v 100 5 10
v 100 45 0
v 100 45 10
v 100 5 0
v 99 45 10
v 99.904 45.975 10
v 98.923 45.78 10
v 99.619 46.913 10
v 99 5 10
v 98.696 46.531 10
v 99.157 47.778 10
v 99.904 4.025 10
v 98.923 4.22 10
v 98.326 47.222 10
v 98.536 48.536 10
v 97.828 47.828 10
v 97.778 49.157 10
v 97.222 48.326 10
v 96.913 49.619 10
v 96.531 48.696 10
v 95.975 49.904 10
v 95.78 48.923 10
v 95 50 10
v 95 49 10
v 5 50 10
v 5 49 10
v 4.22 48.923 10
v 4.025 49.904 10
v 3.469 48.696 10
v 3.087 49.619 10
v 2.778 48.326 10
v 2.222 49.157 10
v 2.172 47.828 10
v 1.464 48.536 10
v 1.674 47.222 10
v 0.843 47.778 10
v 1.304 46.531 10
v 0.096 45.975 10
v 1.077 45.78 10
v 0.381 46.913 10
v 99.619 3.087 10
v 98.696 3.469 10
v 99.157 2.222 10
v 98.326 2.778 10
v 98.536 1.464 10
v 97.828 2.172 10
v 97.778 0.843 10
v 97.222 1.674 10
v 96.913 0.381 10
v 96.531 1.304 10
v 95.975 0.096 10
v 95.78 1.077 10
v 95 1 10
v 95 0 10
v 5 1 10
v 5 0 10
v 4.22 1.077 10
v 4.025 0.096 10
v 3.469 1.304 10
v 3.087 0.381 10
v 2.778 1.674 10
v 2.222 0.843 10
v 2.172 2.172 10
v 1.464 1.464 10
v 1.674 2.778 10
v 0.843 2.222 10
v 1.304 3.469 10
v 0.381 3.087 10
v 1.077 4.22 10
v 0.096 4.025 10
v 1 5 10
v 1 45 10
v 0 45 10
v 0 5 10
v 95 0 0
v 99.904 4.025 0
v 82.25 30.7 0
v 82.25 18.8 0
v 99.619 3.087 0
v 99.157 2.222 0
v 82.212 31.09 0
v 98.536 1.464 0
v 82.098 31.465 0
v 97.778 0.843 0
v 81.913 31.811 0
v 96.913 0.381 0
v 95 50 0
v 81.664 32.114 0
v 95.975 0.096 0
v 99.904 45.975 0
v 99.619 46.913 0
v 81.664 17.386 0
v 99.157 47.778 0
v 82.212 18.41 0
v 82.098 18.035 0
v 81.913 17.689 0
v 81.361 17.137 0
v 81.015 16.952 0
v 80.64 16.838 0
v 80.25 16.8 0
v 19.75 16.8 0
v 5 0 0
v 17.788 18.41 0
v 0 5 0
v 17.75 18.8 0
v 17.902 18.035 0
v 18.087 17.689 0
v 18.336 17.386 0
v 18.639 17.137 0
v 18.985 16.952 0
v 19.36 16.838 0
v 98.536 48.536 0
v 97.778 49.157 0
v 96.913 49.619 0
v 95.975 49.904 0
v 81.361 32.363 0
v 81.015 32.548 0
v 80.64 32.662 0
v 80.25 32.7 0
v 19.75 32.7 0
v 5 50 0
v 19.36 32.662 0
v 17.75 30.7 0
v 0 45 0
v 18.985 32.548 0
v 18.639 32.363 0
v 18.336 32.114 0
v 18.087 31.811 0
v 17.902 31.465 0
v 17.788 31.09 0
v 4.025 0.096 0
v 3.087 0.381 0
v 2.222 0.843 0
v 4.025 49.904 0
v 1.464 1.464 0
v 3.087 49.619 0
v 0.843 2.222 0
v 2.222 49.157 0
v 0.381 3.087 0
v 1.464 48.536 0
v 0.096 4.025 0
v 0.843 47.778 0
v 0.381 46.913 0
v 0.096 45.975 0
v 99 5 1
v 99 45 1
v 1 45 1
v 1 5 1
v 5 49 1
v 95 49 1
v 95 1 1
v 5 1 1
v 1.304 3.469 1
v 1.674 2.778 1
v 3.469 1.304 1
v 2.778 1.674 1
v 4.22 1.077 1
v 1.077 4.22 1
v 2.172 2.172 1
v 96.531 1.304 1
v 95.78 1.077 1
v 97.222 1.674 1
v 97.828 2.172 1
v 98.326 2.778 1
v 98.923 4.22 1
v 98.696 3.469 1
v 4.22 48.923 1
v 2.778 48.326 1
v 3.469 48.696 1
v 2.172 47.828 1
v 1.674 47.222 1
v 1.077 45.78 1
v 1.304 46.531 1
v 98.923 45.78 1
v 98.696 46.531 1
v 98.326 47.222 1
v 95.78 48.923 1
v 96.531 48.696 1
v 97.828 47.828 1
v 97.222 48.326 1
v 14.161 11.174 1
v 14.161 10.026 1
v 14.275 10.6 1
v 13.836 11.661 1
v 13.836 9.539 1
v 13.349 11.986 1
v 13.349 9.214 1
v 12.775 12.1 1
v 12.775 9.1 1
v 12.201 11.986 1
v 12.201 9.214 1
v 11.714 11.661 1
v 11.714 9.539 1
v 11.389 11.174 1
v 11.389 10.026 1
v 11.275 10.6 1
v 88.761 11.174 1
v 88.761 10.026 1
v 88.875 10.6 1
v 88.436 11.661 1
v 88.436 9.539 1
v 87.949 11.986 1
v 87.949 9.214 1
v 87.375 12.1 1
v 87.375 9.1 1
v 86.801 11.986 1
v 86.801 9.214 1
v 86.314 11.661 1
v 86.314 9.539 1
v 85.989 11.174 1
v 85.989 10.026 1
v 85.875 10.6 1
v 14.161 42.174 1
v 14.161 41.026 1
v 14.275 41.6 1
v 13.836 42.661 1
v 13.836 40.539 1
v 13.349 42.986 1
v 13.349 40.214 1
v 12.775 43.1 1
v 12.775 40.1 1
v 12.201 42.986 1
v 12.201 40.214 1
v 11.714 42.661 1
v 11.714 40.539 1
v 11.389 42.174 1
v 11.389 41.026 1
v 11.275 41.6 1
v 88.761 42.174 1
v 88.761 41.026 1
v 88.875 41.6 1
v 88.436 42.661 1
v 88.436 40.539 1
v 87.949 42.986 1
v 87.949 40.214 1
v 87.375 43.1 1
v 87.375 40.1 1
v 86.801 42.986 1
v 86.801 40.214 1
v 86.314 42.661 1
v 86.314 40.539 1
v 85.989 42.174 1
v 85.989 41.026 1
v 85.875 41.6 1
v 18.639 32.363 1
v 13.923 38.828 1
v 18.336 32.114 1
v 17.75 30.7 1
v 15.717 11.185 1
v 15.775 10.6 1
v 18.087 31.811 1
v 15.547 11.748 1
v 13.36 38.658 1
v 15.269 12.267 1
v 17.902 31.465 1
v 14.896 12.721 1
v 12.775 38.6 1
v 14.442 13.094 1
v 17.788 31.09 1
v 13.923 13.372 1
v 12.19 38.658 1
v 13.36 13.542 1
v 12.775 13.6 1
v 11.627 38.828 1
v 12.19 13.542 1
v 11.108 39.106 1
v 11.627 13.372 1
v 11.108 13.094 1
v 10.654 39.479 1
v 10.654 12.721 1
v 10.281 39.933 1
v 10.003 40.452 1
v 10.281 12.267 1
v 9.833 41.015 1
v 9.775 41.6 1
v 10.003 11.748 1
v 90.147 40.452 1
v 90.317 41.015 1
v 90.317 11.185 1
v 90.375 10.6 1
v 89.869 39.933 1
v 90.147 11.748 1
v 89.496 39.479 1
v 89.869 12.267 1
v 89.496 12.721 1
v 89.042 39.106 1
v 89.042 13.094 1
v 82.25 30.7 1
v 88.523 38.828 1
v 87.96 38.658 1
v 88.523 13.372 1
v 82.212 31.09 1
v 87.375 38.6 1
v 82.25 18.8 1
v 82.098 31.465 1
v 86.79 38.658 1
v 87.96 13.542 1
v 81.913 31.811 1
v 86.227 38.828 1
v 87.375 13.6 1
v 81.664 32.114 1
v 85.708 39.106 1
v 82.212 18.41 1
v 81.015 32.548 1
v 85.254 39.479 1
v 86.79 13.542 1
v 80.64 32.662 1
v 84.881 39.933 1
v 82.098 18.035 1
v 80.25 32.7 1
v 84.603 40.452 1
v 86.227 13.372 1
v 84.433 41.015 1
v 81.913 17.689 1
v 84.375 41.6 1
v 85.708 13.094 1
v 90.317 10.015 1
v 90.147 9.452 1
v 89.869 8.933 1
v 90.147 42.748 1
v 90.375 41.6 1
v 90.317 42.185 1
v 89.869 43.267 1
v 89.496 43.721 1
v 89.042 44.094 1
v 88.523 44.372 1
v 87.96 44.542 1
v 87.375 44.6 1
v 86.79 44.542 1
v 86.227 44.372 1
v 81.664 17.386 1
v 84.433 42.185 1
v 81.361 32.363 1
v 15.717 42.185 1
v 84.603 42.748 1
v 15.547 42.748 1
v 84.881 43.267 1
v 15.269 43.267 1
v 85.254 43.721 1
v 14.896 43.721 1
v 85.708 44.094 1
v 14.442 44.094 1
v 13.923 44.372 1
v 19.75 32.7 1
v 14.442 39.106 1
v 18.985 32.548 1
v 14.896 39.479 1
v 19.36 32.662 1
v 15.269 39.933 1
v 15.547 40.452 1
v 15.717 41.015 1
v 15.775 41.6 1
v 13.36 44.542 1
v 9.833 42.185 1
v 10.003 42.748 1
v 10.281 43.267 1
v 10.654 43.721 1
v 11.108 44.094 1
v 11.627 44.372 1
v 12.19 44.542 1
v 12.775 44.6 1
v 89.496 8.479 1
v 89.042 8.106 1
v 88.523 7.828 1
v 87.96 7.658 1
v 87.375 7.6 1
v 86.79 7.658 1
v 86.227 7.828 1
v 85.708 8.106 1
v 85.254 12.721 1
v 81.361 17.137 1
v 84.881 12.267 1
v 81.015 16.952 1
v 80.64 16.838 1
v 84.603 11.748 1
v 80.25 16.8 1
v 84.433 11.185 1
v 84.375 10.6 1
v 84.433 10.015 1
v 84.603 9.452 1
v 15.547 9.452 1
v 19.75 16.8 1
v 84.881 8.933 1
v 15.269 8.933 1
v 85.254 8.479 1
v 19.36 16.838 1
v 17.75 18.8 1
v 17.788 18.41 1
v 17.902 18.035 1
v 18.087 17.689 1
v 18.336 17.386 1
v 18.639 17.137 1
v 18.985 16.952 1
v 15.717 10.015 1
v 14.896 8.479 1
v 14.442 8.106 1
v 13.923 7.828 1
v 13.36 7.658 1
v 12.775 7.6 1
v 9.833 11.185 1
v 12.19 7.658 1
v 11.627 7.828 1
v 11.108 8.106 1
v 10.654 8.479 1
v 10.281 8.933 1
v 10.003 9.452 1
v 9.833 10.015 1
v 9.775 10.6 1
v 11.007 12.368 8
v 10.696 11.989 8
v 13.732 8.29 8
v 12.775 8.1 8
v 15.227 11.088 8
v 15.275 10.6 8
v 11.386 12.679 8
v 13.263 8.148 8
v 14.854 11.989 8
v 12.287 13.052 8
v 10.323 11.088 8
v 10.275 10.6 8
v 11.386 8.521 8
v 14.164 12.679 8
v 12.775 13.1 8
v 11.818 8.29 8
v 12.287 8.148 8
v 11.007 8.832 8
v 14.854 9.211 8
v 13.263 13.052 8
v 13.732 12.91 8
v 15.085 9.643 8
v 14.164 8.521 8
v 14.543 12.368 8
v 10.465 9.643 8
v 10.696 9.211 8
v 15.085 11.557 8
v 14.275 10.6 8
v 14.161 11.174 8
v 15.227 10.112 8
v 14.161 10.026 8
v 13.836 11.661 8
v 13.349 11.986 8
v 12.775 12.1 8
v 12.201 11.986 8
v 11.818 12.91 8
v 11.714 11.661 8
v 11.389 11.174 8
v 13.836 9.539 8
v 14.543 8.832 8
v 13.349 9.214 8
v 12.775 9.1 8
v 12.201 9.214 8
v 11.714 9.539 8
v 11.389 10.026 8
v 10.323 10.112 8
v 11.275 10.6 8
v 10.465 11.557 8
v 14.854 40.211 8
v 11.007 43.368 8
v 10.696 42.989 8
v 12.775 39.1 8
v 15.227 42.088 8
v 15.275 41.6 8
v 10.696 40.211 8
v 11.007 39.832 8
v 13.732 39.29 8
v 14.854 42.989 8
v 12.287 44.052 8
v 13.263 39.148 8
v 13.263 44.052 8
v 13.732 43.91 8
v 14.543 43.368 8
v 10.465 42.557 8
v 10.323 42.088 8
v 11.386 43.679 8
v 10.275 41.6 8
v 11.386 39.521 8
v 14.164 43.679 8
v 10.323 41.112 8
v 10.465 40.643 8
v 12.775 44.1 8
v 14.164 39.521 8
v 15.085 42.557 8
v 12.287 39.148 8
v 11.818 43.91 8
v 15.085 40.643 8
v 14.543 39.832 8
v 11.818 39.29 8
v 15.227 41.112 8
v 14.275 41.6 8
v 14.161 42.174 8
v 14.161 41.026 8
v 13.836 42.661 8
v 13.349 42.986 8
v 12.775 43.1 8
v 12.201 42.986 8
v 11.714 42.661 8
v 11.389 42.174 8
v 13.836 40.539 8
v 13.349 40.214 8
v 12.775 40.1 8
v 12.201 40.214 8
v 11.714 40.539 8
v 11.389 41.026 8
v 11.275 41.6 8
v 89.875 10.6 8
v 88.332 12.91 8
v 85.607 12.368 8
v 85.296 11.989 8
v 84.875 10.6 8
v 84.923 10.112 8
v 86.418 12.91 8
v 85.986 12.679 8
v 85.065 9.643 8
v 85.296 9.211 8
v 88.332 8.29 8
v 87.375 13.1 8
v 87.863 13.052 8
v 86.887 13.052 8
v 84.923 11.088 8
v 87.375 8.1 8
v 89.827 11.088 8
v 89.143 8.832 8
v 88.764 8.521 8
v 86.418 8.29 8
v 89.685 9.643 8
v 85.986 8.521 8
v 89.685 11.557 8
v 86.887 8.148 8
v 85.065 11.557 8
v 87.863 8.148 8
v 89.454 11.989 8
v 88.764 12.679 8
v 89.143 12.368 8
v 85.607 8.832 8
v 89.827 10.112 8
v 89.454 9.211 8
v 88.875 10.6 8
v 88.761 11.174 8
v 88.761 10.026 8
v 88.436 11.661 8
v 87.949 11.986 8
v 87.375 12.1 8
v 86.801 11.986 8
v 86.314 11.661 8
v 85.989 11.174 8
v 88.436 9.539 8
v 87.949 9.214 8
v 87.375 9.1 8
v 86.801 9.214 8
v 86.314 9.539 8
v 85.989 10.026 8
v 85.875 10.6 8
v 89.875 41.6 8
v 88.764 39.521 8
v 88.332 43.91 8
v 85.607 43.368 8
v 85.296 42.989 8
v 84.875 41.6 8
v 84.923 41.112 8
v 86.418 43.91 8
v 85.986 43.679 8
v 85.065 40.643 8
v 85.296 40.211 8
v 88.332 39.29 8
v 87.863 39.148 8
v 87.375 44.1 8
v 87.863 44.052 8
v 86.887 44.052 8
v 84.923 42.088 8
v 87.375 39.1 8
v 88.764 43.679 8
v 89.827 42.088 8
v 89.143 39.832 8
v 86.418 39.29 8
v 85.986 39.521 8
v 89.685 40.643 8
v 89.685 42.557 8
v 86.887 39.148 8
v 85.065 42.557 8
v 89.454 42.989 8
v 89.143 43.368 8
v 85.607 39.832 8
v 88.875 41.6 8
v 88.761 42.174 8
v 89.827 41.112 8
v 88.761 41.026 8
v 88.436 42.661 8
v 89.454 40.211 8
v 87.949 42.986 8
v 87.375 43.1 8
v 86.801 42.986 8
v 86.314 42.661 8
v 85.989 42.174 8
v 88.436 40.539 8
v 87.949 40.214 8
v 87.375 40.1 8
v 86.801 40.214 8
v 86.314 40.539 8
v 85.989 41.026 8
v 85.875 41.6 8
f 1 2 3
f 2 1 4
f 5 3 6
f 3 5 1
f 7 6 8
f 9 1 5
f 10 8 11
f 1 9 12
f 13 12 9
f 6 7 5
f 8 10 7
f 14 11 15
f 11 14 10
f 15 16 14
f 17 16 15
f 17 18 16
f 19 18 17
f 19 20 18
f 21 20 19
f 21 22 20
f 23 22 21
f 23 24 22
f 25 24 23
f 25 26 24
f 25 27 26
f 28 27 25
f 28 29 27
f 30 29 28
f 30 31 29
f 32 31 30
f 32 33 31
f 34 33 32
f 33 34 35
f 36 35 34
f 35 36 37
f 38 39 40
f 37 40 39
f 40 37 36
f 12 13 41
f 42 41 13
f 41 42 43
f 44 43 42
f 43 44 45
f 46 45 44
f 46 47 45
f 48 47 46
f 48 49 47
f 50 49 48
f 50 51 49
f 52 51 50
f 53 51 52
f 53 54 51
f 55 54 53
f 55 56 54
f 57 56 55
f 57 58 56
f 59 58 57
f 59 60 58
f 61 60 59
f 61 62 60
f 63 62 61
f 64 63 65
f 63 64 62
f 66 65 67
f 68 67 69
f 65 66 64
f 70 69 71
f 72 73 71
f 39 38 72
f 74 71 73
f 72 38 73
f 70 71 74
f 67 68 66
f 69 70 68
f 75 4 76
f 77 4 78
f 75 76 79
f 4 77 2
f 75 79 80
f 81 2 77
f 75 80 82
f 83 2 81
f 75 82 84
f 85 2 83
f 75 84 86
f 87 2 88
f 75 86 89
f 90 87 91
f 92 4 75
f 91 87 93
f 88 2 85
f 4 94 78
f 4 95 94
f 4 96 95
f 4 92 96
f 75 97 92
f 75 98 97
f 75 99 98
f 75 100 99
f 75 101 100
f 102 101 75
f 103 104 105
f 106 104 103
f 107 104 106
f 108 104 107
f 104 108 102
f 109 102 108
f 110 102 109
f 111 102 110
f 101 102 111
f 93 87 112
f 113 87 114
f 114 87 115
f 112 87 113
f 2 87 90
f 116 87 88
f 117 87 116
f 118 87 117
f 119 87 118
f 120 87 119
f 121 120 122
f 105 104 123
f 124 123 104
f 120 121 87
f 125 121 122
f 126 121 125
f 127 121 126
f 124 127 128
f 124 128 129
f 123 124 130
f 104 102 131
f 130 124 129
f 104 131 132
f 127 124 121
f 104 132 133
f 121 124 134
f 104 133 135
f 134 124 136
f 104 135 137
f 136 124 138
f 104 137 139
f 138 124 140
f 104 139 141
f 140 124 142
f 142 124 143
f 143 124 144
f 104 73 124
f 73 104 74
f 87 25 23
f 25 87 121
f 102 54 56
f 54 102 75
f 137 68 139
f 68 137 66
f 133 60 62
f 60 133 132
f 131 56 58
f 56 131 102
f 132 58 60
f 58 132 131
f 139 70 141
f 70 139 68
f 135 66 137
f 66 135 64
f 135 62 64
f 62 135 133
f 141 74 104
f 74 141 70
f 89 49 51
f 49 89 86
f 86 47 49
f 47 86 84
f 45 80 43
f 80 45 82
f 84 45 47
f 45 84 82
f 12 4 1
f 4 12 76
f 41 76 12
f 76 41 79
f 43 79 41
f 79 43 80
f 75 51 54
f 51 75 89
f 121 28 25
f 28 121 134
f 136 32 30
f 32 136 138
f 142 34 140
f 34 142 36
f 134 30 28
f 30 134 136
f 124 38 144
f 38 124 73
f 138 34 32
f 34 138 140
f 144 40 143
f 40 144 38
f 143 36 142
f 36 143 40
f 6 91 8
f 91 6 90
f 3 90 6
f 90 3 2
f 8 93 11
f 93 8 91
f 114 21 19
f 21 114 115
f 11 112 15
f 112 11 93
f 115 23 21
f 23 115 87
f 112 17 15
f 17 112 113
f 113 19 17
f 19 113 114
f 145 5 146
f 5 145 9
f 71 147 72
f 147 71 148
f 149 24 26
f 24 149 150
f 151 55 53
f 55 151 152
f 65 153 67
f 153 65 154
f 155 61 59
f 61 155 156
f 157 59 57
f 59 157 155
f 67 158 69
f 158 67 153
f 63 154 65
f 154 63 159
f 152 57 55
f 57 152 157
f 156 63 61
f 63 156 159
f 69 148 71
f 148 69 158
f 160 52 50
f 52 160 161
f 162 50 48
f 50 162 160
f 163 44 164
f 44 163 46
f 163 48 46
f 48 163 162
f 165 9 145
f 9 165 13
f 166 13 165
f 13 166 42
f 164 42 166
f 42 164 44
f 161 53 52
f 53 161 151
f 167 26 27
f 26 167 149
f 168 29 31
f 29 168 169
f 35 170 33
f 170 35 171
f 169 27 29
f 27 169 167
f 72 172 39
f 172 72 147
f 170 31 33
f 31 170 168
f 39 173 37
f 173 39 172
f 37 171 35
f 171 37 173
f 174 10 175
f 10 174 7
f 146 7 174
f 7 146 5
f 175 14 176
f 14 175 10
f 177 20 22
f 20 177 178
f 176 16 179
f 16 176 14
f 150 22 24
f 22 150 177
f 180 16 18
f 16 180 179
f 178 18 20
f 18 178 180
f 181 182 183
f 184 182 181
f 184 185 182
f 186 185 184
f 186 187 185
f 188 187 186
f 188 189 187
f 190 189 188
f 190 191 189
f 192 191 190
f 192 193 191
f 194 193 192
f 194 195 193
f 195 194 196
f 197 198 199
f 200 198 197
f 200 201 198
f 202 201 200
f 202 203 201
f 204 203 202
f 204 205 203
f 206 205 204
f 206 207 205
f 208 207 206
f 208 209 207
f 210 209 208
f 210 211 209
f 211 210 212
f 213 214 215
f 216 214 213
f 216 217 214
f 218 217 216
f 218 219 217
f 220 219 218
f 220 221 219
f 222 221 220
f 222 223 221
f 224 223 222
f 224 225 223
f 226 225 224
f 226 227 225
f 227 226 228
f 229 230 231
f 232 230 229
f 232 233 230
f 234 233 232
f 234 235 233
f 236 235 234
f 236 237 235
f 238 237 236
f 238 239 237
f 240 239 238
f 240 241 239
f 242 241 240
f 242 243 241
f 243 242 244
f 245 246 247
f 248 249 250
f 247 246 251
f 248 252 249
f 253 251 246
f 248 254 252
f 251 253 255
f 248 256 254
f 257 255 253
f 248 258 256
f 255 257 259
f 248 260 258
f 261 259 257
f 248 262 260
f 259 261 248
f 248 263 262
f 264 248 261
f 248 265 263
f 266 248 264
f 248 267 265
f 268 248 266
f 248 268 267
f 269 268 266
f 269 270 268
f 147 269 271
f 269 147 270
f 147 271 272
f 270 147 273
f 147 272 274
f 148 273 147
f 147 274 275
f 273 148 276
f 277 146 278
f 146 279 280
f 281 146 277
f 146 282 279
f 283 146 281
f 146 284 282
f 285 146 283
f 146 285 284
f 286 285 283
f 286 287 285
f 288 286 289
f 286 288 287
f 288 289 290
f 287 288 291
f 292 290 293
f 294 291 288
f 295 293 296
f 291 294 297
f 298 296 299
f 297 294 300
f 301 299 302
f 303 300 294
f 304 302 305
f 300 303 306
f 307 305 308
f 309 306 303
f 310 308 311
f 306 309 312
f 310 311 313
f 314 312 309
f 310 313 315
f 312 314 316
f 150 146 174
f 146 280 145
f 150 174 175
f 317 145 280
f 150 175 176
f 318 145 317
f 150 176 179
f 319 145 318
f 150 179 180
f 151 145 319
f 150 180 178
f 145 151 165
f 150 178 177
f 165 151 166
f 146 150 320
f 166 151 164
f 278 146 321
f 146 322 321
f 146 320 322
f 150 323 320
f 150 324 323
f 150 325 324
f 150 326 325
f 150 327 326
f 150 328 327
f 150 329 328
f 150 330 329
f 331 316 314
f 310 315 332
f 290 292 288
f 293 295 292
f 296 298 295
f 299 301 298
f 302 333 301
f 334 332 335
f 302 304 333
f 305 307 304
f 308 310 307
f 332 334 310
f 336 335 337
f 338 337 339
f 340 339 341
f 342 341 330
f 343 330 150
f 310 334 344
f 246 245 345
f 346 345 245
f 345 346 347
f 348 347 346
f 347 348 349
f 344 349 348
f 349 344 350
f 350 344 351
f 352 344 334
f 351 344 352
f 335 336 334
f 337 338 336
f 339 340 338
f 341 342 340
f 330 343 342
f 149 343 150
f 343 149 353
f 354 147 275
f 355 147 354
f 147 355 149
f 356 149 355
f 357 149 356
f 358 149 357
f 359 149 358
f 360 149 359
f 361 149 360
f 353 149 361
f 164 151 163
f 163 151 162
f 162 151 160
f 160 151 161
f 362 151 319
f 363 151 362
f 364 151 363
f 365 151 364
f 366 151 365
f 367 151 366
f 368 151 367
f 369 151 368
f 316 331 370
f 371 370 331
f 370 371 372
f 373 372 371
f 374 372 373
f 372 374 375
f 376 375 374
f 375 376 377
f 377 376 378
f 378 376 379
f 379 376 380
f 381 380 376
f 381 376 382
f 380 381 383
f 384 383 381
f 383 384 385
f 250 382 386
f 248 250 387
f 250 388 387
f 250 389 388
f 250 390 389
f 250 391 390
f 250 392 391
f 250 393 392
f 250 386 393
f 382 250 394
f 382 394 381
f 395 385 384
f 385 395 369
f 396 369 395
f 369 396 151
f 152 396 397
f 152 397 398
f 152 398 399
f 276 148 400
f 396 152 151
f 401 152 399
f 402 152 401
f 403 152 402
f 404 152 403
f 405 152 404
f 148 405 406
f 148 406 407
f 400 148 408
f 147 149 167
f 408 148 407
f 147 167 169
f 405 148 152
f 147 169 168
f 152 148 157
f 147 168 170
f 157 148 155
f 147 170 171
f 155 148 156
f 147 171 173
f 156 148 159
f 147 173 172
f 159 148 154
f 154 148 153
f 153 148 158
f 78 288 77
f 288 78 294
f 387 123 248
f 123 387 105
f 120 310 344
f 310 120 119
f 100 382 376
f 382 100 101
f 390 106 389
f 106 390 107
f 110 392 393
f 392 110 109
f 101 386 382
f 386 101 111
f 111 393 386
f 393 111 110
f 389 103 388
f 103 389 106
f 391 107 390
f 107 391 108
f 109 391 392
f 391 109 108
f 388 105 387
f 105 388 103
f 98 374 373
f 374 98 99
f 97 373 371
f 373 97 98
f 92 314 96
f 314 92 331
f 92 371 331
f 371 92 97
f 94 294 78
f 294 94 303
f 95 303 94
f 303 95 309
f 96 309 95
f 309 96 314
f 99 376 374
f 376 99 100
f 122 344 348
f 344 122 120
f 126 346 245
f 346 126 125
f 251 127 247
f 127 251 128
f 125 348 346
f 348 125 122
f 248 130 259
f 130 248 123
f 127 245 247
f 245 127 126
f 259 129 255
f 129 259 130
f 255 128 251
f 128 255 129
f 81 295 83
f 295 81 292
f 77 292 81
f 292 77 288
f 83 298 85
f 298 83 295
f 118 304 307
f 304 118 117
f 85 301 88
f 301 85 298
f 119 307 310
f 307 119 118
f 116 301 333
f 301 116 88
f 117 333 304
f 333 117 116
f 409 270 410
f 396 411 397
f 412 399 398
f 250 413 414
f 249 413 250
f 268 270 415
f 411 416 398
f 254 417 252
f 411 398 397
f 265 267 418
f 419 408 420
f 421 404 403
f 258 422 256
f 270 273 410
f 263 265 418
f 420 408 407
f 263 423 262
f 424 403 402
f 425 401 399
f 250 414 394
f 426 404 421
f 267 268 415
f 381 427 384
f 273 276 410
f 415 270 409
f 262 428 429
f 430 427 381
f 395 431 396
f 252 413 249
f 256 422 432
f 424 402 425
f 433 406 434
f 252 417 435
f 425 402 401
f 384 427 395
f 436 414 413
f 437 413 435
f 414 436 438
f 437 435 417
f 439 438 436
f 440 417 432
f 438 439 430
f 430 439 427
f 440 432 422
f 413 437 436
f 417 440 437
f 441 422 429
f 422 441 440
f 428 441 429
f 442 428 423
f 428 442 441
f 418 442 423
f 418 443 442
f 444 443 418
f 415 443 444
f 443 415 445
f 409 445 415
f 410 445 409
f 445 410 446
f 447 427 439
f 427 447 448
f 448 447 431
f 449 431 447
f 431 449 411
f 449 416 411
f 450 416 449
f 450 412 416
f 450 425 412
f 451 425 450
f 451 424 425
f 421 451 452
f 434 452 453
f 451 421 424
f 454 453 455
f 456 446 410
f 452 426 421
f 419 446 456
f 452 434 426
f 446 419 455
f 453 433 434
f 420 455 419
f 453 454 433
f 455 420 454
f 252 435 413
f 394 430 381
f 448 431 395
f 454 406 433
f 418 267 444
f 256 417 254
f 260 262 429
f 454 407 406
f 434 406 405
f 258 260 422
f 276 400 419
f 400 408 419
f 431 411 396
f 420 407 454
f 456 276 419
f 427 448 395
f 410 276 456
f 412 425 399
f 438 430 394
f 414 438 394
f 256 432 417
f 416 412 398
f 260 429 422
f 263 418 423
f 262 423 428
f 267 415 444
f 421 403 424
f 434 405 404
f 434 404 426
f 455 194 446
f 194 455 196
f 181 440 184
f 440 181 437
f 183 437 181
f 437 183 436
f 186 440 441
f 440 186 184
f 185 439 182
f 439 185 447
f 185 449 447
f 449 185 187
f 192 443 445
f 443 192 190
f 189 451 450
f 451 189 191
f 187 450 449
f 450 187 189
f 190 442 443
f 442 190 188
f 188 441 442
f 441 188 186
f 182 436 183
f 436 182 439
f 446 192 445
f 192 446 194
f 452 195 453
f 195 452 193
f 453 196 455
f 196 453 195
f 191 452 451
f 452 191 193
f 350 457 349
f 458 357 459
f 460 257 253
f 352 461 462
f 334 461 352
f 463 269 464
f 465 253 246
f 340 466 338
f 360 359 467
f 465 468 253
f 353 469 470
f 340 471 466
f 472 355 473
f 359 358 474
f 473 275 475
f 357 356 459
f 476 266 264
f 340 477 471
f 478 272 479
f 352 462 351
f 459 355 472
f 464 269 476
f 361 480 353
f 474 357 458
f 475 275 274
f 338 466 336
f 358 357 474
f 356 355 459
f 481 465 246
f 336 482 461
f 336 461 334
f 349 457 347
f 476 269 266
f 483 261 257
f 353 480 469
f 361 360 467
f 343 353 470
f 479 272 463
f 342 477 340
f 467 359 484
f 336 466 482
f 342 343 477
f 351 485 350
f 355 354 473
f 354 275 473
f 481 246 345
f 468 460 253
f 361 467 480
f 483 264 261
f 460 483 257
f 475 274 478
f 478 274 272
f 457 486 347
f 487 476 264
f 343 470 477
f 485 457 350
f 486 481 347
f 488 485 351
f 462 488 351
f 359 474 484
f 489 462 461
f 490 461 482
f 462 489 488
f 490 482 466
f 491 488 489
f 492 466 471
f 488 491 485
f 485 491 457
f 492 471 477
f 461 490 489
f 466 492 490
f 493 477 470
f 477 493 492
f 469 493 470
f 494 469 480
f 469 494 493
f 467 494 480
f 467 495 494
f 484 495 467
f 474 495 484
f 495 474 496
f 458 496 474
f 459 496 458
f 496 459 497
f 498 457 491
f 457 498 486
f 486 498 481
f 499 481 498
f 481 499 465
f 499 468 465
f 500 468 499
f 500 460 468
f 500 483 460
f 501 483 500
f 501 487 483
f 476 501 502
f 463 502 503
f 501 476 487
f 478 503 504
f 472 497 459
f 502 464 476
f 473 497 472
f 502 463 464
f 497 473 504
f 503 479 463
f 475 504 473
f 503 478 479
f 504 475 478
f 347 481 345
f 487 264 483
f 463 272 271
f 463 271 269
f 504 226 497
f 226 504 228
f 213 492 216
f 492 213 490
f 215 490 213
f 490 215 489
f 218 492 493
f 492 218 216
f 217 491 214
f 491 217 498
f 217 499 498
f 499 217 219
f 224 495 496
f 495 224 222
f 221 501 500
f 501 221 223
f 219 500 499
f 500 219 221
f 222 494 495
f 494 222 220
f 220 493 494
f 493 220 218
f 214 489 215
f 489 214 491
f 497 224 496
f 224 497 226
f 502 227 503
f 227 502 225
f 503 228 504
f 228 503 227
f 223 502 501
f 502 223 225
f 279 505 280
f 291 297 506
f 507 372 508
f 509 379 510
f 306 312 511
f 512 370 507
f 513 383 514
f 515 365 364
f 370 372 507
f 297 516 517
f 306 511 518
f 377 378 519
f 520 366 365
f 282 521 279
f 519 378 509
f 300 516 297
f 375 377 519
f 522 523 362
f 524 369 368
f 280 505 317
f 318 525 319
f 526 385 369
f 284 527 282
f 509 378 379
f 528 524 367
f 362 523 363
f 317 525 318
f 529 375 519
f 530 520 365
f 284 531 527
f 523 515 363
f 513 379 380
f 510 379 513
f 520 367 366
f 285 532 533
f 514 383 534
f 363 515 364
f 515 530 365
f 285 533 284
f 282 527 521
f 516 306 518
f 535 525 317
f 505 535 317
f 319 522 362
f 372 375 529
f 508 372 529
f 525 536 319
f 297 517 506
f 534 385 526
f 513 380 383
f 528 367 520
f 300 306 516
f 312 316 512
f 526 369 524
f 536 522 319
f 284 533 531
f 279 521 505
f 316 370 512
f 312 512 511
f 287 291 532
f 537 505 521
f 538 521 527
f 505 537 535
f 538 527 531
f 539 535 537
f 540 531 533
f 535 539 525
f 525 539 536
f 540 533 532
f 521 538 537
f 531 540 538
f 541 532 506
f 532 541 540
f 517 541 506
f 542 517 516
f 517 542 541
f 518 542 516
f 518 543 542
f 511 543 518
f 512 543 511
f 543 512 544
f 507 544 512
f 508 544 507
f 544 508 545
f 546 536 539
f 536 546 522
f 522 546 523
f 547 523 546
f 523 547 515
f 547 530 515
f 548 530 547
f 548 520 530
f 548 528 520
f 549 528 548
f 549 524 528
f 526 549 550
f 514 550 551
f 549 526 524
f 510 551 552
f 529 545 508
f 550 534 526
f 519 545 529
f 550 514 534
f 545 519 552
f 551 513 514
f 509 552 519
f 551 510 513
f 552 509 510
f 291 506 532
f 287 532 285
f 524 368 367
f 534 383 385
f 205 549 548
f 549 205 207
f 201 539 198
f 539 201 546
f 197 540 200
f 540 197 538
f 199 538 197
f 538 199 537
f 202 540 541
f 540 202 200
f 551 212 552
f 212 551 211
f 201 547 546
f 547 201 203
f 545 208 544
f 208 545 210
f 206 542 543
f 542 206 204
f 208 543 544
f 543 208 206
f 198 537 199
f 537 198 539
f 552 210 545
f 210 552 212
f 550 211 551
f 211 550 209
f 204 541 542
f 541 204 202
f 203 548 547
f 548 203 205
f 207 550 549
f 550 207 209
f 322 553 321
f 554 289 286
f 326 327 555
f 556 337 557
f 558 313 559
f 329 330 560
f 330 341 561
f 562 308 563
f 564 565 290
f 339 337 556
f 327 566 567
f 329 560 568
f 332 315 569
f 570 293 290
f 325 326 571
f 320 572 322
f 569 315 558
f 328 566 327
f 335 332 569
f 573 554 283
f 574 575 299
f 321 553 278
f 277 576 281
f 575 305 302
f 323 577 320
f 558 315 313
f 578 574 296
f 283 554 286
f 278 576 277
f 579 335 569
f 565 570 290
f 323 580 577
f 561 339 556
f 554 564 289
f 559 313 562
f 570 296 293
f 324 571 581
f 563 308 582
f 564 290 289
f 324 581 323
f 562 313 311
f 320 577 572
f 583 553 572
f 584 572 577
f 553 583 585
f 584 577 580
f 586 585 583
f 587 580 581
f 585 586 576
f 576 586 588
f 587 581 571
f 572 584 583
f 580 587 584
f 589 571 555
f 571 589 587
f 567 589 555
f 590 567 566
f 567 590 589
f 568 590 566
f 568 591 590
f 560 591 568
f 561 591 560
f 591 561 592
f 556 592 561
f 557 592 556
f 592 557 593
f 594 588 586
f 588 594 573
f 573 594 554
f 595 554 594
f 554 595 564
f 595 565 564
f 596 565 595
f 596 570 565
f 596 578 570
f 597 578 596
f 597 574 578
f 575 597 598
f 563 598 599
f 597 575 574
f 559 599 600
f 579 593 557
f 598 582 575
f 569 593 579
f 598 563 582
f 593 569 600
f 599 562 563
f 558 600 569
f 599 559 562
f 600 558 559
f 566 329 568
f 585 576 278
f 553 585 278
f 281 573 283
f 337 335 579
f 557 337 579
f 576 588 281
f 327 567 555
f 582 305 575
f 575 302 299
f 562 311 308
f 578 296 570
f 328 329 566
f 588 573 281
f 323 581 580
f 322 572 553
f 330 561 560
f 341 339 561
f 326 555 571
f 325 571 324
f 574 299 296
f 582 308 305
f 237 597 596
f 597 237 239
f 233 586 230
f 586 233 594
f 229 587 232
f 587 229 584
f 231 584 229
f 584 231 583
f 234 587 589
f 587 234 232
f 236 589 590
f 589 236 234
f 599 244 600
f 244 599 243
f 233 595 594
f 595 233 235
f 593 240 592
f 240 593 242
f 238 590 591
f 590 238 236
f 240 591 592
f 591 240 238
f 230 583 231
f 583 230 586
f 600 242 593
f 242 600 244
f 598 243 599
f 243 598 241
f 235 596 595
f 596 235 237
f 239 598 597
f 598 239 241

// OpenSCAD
//base plate
size_x=100;
size_y=50;
size_z=1;
corner_radius=5;
corner_faces=32;

//cutout
cutout_corner_radius=2;
cutout_corner_faces=32;
offset_x=10;
offset_y=8;

//rim
rim_height=10;

module plate (sizeX, sizeY, sizeZ, cornerRadius, cornerFaces)
{
	union()
	{
		difference()
		{
			cube([sizeX,sizeY,sizeZ]);		
			cube([cornerRadius,cornerRadius,	sizeZ+1]);
			translate([sizeX-cornerRadius,0,0]) cube([cornerRadius,cornerRadius,sizeZ+1]);
			translate([0,sizeY-cornerRadius,0]) cube([cornerRadius,cornerRadius,sizeZ+1]);
			translate([sizeX-cornerRadius,sizeY-cornerRadius,0]) cube([cornerRadius,cornerRadius,sizeZ+1]);
		}
		translate([cornerRadius,cornerRadius,0]) cylinder(r=cornerRadius,h=sizeZ, $fn=cornerFaces);
		translate([sizeX-cornerRadius,cornerRadius,0]) cylinder(r=cornerRadius,h=sizeZ, $fn=cornerFaces);
		translate([cornerRadius,sizeY-cornerRadius,0]) cylinder(r=cornerRadius,h=sizeZ, $fn=cornerFaces);
		translate([sizeX-cornerRadius,sizeY-cornerRadius,0]) cylinder(r=cornerRadius,h=sizeZ, $fn=cornerFaces);
	}
}

module posts()
{

	union()
	{
		difference()
		{
			translate([0+2.775,0+2.6,size_z]) cylinder(r1=6/2, r2=5/2,h=7, $fn=32);	
			translate([0+2.775,0+2.6,size_z]) cylinder(r=3/2,h=7.5, $fn=16);
		}
		difference()
		{
			translate([0+2.775,31+2.6,size_z]) cylinder(r1=6/2, r2=5/2,h=7, $fn=32);
			translate([0+2.775,31+2.6,size_z]) cylinder(r=3/2,h=7.5, $fn=16);
		}

		difference()
		{
			translate([74.60+2.775,0+2.6,size_z]) cylinder(r1=6/2, r2=5/2,h=7, $fn=32);
			translate([74.60+2.775,0+2.6,size_z]) cylinder(r=3/2,h=7.5, $fn=16);
		}	

		difference()
		{
			translate([74.60+2.775,31+2.6,size_z]) cylinder(r1=6/2, r2=5/2,h=7, $fn=32);
			translate([74.60+2.775,31+2.6,size_z]) cylinder(r=3/2,h=7.5, $fn=16);
		}
	}
}


difference()
{
plate (size_x, size_y,rim_height, corner_radius, corner_faces);
translate([size_z,size_z,0])
plate (size_x-(2*size_z), size_y-(2*size_z),rim_height, corner_radius-size_z, corner_faces);
}

union()
{
difference()
{
//base plate
plate (size_x, size_y, size_z, corner_radius, corner_faces);

//display cutout
translate([7.75+offset_x,8.8+offset_y,0])
plate(64.5,15.9,10,cutout_corner_radius,cutout_corner_faces);

}
translate([offset_x,offset_y,0])
posts();
}
